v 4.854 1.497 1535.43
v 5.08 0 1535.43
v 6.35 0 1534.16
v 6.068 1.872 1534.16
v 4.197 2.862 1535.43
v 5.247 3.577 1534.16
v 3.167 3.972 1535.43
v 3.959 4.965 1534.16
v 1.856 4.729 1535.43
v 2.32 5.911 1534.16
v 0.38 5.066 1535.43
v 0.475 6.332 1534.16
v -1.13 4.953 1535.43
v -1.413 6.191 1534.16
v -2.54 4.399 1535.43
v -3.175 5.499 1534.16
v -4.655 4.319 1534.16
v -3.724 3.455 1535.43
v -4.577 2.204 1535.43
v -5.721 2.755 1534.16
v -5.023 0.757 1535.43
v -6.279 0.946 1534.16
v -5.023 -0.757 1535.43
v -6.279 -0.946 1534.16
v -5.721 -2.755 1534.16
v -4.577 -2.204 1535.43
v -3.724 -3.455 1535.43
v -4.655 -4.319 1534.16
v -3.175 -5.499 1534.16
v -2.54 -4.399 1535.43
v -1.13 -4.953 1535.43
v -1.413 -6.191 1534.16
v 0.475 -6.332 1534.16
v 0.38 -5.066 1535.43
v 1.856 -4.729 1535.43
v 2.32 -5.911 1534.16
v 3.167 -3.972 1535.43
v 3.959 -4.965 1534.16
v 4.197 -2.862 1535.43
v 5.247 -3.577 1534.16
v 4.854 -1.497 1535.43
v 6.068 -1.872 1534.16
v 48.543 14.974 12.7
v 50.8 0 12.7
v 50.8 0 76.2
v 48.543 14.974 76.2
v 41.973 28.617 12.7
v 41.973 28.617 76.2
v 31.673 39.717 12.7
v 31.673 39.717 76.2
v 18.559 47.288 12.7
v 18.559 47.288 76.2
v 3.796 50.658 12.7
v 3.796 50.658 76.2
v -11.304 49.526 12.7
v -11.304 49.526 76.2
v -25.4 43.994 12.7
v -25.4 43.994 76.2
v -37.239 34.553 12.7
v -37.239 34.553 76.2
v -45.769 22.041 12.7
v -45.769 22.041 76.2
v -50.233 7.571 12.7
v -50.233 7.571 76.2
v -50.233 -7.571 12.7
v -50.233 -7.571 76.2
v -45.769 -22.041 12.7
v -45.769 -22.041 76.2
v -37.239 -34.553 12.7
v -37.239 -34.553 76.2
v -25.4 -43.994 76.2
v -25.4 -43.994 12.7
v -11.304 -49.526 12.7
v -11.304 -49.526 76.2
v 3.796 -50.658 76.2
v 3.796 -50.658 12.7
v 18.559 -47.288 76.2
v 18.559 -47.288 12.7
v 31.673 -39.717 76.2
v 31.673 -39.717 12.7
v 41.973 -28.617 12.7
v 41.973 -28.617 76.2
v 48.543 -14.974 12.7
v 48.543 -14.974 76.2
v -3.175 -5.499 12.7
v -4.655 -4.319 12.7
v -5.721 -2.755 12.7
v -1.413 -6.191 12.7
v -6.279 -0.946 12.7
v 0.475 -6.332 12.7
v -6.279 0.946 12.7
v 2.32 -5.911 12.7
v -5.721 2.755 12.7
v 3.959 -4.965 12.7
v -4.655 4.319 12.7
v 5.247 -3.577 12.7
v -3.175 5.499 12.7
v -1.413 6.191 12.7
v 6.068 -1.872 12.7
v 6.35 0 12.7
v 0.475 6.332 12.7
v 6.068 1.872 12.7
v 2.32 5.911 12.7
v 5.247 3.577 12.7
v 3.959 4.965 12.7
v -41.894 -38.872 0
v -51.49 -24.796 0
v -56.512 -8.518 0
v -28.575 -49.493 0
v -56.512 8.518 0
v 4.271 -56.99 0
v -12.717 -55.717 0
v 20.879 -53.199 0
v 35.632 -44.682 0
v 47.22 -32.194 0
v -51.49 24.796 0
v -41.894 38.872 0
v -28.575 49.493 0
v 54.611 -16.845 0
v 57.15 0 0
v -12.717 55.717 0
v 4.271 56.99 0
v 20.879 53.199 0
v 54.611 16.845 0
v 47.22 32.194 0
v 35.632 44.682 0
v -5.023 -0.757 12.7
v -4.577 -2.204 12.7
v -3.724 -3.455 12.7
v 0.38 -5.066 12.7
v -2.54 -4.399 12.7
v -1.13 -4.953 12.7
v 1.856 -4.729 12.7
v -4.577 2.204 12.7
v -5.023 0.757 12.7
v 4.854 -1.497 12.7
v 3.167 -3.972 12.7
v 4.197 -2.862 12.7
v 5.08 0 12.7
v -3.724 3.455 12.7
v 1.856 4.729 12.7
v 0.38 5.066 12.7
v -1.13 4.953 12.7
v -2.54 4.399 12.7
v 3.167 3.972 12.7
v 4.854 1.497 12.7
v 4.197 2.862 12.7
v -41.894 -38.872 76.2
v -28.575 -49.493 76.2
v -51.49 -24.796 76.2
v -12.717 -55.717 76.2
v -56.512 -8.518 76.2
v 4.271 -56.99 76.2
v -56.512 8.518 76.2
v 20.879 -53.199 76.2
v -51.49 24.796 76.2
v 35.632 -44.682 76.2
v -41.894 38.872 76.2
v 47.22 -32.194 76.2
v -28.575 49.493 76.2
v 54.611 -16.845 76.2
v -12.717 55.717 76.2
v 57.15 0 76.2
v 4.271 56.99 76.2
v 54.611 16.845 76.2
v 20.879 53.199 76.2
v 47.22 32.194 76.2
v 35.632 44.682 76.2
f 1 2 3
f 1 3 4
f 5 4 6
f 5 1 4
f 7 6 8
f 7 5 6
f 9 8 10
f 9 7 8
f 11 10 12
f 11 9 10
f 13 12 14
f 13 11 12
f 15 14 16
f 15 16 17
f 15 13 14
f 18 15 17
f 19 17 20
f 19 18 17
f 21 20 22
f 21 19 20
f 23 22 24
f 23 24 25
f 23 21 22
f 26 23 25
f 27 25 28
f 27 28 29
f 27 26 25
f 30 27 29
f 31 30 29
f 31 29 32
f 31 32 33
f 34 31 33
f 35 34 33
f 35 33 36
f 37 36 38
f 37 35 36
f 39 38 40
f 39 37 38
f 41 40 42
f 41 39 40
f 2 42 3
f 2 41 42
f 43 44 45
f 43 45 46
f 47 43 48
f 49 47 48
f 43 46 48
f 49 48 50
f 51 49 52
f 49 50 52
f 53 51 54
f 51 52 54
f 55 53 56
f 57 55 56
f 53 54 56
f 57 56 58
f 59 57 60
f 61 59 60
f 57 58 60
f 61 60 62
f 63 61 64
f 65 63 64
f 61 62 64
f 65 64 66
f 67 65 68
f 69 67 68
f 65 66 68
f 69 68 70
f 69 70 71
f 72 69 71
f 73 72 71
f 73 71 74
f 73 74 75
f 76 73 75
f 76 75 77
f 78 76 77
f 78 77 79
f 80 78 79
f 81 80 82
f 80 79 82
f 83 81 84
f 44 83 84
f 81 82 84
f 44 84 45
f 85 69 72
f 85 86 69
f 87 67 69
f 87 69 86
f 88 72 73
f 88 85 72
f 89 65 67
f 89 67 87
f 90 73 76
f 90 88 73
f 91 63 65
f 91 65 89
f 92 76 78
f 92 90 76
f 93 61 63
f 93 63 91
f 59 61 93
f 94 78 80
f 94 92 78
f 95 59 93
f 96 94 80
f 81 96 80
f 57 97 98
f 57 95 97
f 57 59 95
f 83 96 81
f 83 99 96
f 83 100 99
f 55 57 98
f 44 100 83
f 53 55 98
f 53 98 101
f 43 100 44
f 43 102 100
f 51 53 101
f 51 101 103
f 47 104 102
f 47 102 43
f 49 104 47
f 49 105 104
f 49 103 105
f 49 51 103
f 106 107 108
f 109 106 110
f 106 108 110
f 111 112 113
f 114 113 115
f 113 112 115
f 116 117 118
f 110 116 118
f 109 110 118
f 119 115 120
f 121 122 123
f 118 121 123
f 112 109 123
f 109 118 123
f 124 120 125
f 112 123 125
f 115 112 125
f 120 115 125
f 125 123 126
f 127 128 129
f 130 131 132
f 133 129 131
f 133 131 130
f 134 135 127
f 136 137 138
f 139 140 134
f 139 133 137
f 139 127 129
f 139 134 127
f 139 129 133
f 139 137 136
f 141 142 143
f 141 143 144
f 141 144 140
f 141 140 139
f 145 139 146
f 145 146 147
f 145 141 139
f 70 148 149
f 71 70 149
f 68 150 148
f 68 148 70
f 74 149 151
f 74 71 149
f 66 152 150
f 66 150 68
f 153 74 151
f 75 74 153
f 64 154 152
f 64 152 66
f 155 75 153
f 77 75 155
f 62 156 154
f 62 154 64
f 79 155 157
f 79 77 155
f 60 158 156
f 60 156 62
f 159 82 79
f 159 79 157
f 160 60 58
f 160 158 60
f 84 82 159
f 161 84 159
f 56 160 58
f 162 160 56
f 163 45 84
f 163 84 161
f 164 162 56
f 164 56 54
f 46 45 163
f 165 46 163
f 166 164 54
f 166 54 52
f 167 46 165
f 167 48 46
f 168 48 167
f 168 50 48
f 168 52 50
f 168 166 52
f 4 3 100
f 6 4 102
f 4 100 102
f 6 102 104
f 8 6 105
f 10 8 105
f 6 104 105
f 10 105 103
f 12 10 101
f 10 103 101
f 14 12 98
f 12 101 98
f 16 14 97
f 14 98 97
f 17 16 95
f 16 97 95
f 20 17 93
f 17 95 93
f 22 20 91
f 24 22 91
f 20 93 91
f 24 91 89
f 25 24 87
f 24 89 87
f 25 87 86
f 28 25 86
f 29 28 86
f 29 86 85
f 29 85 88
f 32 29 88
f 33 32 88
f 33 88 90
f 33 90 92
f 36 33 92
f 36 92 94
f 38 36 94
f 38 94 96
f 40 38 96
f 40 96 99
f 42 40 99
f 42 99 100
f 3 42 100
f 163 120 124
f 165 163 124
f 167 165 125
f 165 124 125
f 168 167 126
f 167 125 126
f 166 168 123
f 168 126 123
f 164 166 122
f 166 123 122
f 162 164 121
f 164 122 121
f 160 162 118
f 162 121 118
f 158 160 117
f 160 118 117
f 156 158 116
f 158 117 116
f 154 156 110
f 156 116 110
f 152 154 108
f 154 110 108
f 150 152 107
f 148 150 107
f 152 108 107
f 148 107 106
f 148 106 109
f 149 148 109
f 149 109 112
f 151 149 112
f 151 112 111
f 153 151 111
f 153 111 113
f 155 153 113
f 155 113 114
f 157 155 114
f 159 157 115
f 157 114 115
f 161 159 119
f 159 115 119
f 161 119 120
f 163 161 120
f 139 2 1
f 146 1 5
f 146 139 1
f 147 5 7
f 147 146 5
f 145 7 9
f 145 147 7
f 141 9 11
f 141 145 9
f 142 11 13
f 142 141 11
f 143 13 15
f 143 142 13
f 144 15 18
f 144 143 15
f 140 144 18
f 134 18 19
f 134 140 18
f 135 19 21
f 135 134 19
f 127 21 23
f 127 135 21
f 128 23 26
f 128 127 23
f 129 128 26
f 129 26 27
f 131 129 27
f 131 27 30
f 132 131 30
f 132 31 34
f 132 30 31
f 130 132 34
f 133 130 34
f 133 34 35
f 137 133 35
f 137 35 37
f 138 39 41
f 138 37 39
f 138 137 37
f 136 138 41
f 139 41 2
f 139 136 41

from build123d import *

# Parameters (mm, degrees)
F0_R     = 57.15
F1_DEPTH = 76.2
F2_R     = 50.8
F3_DEPTH = 63.5
F4_R     = 6.35
F4_R_2   = 5.08
F5_DEPTH = 1524


# Not quite as in the source:
# - a fillet or chamfer that OpenCascade refuses, or shapes differently, is made with other operations: its cross-section is extruded or revolved along the edge and cut away or added


with BuildPart() as f1:
    # F0 (on Top) → F1 (new body)
    with BuildSketch(Plane.XY):
        Circle(F0_R)
    extrude(amount=F1_DEPTH)

    # F2 (on face) → F3 (cut)
    with BuildSketch(Plane.XY.offset(76.2)):
        Circle(F2_R)
    extrude(amount=-F3_DEPTH, mode=Mode.SUBTRACT)

    # F4 (on face) → F5 (join)
    with BuildSketch(Plane.XY.offset(12.7)):
        Circle(F4_R)
        Circle(F4_R_2, mode=Mode.SUBTRACT)
    extrude(amount=F5_DEPTH)

    # F6: chamfer of 2.54 on 1 edges, made by hand

    # F6_s1 → F6_t2 (revolve, cut)
    with BuildSketch(Plane.XZ):
        Polygon((6.35, 1534.16), (3.81, 1536.7), (6.35, 1536.7), align=None)
    revolve(axis=Axis((0, 0, 1536.7), (0, 0, 1)), mode=Mode.SUBTRACT)


solid = f1.part
